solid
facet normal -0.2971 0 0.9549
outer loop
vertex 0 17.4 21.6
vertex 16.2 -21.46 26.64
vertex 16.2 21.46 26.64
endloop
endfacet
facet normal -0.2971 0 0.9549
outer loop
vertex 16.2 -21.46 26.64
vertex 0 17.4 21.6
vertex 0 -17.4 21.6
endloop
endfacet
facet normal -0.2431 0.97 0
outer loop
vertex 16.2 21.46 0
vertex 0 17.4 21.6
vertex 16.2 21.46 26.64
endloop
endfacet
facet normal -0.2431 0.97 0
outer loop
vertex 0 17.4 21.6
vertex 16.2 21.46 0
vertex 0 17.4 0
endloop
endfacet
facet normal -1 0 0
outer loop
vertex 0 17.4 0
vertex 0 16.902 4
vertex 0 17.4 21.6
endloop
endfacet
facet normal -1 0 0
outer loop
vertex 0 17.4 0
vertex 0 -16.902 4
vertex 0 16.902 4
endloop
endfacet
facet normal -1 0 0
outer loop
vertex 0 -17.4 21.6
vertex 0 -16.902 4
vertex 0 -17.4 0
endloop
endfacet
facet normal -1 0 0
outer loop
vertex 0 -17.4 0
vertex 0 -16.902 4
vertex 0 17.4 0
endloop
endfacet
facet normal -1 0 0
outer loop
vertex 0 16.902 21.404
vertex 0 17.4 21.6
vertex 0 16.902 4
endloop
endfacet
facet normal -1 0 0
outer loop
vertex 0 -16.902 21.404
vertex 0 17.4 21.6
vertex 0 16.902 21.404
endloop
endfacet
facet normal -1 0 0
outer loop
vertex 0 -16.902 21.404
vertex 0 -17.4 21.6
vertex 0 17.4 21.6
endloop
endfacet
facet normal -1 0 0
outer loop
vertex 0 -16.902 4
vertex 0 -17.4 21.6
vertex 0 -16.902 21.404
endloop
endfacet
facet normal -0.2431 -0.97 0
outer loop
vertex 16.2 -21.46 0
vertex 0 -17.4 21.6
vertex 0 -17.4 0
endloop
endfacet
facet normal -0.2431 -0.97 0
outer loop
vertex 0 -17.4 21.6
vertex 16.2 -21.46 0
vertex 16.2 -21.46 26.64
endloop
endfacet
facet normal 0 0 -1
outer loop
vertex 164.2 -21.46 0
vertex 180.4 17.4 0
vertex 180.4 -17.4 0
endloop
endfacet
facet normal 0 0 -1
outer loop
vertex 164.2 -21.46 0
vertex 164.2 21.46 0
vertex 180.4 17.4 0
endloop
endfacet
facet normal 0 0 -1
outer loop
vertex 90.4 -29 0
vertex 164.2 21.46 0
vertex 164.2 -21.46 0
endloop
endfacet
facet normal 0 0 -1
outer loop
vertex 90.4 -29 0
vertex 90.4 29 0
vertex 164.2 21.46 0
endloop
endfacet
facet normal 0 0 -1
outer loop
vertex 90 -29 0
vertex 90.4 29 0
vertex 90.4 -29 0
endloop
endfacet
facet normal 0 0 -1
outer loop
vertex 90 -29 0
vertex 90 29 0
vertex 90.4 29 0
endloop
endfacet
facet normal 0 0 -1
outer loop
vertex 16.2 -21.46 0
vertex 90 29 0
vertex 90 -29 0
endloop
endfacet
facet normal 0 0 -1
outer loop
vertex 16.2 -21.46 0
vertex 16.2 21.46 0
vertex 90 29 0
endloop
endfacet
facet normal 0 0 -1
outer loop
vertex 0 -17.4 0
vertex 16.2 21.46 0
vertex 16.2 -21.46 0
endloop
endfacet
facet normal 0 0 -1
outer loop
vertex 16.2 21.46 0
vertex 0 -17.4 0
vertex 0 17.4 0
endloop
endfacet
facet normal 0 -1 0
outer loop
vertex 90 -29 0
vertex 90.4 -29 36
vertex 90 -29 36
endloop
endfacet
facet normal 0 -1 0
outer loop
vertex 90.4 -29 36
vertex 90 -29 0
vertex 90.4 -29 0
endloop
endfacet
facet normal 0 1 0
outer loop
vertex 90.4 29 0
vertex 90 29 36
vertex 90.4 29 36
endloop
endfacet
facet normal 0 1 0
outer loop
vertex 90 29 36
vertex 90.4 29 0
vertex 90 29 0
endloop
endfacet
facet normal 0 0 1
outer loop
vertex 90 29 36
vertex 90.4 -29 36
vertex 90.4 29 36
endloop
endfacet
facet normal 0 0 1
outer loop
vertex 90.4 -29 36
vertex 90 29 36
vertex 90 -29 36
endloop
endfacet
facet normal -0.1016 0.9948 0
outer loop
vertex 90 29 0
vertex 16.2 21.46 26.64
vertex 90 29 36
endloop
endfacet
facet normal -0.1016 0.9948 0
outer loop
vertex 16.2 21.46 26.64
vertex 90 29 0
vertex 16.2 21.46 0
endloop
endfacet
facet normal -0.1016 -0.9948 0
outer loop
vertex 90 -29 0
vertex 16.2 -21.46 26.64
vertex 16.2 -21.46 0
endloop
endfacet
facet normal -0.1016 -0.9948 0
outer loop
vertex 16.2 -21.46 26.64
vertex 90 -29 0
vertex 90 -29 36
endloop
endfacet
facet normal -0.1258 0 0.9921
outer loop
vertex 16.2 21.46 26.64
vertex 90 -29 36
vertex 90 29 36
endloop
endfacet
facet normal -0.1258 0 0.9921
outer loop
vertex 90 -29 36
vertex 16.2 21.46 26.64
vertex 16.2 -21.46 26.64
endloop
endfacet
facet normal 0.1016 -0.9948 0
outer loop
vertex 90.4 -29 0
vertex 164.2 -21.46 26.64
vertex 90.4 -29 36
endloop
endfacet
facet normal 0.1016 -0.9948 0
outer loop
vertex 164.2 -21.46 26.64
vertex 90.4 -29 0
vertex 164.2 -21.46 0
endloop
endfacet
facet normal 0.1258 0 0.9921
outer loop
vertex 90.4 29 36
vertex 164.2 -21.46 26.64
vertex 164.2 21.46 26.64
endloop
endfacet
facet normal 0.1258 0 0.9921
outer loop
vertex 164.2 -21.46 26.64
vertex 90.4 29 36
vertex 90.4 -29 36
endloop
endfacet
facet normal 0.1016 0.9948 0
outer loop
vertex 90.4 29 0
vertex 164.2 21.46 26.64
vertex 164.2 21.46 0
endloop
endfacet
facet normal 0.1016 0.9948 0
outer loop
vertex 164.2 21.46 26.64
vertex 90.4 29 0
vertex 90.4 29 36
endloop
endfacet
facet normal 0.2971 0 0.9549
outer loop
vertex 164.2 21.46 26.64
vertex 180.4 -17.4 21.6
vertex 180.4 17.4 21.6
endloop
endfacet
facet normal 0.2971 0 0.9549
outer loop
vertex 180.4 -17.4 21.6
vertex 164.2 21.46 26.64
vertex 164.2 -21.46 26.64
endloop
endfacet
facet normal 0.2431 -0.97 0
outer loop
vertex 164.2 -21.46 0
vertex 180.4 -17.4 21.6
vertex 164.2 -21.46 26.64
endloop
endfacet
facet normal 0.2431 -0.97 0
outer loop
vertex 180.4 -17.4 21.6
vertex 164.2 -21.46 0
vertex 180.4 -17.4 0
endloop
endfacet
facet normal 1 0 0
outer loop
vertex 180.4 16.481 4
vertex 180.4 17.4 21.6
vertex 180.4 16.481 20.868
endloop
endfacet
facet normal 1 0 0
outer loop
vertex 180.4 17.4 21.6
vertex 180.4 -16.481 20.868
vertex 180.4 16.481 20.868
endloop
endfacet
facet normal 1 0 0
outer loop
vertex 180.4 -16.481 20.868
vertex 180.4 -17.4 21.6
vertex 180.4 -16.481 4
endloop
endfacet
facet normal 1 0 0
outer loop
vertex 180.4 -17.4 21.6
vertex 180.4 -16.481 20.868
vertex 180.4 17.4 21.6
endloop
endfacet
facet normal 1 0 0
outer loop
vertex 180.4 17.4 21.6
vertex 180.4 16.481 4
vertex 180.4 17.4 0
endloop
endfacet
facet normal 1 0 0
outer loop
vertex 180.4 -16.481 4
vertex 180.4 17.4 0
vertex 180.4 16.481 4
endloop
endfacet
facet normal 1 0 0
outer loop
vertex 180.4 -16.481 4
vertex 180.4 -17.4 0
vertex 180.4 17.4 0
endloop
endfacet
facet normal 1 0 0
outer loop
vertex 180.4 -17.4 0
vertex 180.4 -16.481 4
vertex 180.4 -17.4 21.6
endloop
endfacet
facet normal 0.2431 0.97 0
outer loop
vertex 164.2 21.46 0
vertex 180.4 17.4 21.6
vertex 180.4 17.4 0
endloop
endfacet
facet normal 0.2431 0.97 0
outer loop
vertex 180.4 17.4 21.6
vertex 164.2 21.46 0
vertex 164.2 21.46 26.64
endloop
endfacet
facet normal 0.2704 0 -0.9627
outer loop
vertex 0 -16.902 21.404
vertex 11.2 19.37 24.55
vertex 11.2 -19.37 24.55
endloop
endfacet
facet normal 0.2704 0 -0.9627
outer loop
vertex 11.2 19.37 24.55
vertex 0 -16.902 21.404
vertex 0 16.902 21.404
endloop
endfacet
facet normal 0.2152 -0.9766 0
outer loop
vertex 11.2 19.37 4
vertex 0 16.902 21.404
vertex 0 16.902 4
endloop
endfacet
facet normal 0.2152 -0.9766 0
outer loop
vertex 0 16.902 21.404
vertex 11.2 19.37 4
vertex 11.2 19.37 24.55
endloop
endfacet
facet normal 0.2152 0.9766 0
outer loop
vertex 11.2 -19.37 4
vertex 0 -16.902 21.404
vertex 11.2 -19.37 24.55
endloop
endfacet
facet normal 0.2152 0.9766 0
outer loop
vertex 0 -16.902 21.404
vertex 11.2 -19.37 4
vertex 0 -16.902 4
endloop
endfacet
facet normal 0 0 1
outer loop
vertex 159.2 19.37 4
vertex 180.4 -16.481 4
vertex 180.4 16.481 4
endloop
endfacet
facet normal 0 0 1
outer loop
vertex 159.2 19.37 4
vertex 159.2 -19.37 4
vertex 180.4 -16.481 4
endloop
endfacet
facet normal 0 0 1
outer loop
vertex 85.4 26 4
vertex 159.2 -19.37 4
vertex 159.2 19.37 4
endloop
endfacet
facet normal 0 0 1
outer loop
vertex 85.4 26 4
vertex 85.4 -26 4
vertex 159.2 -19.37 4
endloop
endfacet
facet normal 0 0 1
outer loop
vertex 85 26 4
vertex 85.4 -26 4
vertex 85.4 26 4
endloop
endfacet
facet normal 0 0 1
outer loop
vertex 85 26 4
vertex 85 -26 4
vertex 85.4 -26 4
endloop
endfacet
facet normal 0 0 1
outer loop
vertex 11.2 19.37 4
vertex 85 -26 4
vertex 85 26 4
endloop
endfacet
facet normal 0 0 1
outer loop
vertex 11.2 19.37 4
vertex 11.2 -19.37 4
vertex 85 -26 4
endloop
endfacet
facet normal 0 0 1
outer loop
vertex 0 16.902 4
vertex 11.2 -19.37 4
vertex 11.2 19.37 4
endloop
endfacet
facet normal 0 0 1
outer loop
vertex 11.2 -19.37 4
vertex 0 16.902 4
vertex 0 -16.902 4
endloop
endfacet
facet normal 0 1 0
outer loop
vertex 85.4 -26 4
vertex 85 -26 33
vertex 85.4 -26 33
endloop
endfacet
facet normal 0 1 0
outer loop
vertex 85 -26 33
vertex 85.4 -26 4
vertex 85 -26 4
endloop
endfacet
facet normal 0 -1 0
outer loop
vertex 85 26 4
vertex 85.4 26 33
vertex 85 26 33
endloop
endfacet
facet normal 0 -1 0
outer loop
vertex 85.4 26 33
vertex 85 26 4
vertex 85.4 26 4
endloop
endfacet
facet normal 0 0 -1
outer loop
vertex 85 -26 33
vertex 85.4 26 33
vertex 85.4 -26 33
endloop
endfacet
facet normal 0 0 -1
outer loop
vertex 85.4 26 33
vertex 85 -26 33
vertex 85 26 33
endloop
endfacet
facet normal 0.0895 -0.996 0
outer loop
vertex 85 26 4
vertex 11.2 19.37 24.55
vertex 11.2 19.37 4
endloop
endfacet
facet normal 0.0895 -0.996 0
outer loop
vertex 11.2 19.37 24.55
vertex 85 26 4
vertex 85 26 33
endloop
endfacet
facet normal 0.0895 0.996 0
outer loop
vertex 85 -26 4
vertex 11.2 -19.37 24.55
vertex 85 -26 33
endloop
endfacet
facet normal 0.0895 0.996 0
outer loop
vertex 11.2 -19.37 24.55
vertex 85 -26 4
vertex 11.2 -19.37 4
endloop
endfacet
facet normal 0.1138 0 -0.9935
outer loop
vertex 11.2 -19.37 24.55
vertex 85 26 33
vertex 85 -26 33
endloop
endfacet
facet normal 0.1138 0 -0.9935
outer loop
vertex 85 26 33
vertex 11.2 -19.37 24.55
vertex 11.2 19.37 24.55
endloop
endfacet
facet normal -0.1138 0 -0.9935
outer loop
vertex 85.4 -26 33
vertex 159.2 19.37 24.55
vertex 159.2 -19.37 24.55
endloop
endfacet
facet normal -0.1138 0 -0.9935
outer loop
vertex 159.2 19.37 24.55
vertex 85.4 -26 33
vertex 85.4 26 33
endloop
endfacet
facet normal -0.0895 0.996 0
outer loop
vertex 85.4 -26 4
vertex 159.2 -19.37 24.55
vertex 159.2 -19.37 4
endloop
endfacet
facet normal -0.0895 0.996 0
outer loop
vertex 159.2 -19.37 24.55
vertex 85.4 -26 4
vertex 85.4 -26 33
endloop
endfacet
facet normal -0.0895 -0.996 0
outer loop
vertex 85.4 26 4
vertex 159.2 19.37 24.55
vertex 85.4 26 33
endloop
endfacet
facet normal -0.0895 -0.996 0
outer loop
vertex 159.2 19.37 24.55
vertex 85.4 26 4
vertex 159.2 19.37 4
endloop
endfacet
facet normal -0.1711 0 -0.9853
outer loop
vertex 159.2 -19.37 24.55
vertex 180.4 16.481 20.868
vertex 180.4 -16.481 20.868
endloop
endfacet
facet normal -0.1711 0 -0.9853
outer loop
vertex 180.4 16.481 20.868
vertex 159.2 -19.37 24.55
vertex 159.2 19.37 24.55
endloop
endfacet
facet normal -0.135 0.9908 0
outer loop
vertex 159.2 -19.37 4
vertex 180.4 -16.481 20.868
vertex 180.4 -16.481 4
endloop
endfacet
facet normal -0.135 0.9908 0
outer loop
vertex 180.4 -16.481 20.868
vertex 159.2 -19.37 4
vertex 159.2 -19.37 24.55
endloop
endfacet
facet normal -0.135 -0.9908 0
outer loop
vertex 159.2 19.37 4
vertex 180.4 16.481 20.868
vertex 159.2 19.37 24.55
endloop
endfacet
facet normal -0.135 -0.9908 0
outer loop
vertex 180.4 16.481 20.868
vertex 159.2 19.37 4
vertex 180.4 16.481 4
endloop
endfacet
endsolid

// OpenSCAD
$fn = 32;

// ----------------------------------------------------------------------
// Faired channel: 180 x 58 x 36 mm, 3 mm walls, faired ends
// ----------------------------------------------------------------------

// --- parameters (mm) ---
length = 180;             // channel length
width = 58;               // channel width at mid length
height = 36;              // channel height at mid length
wall = 3;                 // side wall thickness
floor_t = 4;              // floor thickness
end_w = 34.8;             // faired end width
end_h = 21.6;             // faired end height

difference() {
  union() {
    hull() {
      translate([0, -17.4, 0]) cube([0.4, 34.8, 21.6]);
      translate([16.2, -21.46, 0]) cube([0.4, 42.92, 26.64]);
    }
    hull() {
      translate([16.2, -21.46, 0]) cube([0.4, 42.92, 26.64]);
      translate([90, -29, 0]) cube([0.4, 58, 36]);
    }
    hull() {
      translate([90, -29, 0]) cube([0.4, 58, 36]);
      translate([163.8, -21.46, 0]) cube([0.4, 42.92, 26.64]);
    }
    hull() {
      translate([163.8, -21.46, 0]) cube([0.4, 42.92, 26.64]);
      translate([180, -17.4, 0]) cube([0.4, 34.8, 21.6]);
    }
  }
  /* cavity, 5 mm proud of both ends so the ports are cut clean */
  hull() {
    translate([-5, -15.8, 4]) cube([0.4, 31.6, 16]);
    translate([11.2, -19.37, 4]) cube([0.4, 38.74, 20.55]);
  }
  hull() {
    translate([11.2, -19.37, 4]) cube([0.4, 38.74, 20.55]);
    translate([85, -26, 4]) cube([0.4, 52, 29]);
  }
  hull() {
    translate([85, -26, 4]) cube([0.4, 52, 29]);
    translate([158.8, -19.37, 4]) cube([0.4, 38.74, 20.55]);
  }
  hull() {
    translate([158.8, -19.37, 4]) cube([0.4, 38.74, 20.55]);
    translate([185, -15.8, 4]) cube([0.4, 31.6, 16]);
  }
}
